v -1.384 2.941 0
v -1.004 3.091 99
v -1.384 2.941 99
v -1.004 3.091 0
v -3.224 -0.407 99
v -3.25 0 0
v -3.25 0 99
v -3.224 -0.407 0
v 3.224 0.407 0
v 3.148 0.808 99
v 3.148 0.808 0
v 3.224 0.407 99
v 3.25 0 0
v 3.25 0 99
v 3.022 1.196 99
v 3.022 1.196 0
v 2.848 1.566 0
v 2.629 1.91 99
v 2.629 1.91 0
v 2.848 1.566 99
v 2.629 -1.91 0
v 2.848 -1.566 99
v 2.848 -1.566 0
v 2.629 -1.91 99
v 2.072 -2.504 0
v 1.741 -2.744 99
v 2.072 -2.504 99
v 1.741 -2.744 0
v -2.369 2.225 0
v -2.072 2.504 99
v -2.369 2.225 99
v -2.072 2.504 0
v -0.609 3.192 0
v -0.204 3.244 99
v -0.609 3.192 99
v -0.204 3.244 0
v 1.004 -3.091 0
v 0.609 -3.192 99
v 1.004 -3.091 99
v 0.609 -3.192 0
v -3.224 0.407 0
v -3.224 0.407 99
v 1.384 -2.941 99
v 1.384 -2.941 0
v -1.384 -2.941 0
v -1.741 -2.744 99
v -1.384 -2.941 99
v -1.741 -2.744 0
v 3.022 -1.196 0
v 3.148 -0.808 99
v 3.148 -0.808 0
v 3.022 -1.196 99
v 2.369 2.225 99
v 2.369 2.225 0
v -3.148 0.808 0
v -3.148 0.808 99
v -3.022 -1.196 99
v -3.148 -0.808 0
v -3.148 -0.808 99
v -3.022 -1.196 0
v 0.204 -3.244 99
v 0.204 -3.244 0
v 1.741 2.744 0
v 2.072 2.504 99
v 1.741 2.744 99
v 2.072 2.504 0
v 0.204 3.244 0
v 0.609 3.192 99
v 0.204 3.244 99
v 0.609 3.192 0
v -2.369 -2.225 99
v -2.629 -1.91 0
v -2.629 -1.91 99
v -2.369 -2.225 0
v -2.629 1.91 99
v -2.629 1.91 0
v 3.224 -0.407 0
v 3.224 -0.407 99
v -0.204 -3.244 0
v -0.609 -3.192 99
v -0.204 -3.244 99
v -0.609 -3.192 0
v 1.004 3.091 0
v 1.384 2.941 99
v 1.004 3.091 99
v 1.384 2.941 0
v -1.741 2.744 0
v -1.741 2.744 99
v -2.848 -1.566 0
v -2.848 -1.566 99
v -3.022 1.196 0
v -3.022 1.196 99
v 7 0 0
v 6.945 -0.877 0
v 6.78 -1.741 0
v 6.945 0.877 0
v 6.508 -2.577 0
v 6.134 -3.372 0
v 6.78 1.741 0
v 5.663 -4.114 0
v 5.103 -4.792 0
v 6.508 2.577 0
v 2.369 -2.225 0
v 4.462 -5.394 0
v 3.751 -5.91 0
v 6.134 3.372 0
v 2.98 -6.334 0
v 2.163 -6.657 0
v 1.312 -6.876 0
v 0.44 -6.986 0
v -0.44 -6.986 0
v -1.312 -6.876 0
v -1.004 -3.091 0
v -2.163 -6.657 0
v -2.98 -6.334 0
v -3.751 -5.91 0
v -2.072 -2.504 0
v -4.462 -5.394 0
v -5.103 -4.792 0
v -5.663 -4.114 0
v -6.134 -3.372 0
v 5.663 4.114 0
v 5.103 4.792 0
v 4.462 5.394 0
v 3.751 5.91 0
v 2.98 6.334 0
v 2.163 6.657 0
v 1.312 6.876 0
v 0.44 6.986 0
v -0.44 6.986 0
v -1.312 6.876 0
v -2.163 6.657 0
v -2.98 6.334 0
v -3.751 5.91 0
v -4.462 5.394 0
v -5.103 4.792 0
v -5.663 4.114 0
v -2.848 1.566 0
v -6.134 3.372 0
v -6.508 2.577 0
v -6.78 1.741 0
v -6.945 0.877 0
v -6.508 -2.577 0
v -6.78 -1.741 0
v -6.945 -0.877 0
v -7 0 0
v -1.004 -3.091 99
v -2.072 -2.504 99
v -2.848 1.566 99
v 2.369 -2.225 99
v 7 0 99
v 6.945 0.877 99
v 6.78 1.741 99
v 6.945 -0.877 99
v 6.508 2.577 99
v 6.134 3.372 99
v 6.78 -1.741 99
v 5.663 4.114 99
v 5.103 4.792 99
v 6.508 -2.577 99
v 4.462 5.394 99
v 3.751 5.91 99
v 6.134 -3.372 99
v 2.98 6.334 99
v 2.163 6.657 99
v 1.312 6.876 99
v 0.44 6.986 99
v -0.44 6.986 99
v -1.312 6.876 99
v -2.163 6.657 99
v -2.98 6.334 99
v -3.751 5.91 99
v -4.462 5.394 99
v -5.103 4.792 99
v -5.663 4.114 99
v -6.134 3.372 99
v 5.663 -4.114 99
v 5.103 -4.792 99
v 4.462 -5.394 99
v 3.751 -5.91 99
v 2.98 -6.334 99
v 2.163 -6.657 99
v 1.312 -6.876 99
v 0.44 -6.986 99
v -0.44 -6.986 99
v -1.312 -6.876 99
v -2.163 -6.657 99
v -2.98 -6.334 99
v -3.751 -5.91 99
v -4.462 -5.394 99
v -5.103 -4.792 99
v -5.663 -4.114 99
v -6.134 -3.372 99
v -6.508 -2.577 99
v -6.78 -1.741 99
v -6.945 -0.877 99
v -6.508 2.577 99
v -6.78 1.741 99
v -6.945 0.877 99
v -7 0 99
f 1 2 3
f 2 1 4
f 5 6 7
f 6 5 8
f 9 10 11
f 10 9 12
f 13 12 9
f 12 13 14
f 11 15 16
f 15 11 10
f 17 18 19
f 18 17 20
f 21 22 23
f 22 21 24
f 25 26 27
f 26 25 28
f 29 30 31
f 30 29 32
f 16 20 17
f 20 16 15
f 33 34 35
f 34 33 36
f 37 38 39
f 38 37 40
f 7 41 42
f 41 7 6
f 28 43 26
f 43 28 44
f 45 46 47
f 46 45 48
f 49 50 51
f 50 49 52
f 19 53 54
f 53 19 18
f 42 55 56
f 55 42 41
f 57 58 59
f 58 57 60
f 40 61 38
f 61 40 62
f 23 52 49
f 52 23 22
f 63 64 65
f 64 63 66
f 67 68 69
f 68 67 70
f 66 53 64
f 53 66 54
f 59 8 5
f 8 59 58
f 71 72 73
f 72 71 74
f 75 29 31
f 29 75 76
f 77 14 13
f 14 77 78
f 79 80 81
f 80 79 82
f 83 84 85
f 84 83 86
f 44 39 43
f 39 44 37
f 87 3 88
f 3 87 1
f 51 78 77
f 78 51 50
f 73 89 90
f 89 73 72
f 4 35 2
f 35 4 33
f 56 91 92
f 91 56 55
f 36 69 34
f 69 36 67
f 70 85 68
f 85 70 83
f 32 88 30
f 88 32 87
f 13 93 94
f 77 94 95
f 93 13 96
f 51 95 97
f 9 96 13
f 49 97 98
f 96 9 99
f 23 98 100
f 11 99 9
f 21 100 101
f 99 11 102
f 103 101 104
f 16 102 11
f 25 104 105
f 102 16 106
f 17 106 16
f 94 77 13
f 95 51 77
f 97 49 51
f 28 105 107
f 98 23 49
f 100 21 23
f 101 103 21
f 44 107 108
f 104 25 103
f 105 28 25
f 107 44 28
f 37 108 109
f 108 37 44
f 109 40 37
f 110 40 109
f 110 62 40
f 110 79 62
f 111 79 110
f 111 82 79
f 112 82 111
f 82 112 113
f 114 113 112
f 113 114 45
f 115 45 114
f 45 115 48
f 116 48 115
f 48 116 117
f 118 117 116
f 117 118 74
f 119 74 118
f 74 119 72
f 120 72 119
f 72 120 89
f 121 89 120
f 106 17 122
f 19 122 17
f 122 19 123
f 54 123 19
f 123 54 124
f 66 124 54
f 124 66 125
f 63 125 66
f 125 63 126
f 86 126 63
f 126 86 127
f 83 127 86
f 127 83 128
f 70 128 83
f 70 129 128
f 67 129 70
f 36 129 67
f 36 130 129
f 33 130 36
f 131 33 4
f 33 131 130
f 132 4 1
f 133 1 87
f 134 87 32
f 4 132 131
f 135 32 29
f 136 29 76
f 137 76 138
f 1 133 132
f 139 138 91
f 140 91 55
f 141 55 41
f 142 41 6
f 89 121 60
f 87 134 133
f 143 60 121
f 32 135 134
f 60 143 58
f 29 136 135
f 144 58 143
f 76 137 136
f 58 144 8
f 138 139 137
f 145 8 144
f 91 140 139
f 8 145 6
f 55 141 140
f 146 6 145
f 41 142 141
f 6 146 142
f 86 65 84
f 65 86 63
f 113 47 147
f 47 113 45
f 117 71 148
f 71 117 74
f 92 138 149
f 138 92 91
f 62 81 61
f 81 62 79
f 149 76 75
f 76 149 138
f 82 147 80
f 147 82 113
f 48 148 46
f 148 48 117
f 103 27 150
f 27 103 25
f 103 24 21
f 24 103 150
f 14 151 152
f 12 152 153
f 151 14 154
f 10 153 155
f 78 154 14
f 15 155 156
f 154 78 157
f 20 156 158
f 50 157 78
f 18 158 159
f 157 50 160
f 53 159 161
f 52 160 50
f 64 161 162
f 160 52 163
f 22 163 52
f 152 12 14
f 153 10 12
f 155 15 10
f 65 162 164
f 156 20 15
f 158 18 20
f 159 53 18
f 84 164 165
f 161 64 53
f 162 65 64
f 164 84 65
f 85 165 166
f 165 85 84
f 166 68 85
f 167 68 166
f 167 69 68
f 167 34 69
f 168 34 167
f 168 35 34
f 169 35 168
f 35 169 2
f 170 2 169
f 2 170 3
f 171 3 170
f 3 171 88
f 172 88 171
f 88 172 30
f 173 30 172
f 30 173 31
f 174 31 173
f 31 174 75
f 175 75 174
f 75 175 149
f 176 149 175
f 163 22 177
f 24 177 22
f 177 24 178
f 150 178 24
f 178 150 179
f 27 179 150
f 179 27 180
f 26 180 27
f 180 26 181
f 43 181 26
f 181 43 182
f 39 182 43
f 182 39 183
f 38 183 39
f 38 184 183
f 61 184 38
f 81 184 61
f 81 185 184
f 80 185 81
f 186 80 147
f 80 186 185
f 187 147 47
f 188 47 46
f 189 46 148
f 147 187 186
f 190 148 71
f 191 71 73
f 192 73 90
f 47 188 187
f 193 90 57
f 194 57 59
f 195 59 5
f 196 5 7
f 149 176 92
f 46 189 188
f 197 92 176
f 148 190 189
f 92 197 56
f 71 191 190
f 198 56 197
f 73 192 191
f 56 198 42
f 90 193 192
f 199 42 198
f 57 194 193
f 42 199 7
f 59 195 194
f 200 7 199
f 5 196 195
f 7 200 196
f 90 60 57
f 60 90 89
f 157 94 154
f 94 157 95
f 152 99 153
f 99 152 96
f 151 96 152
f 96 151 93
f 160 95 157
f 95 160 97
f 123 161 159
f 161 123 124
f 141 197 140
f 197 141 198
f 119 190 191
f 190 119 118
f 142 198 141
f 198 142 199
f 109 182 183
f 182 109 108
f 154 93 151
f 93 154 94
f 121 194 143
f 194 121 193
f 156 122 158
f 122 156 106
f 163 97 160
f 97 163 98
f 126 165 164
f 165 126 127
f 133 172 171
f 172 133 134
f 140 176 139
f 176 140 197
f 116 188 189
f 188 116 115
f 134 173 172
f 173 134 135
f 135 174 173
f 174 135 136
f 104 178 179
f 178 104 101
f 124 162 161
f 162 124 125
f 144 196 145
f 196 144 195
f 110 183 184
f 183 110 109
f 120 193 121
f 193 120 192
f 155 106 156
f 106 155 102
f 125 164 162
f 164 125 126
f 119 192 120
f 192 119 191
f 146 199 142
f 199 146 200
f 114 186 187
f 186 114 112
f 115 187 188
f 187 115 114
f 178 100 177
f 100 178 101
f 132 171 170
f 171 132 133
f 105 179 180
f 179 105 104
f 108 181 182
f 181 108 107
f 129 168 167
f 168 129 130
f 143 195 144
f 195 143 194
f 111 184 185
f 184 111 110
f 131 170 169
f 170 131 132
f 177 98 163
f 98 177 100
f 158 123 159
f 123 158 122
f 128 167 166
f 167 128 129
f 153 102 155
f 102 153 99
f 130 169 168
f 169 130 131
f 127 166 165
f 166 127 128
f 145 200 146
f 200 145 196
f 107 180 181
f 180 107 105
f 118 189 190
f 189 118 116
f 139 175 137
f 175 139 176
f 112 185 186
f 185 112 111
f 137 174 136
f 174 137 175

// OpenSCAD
$fn = 50;


difference() {
	union() {
		cylinder(h = 99, r = 7.0000000000);
	}
	union() {
		cylinder(h = 99, r = 3.2500000000);
		cylinder(h = 99, r = 1.8000000000);
		cylinder(h = 99, r = 1.8000000000);
		cylinder(h = 99, r = 1.8000000000);
	}
}
